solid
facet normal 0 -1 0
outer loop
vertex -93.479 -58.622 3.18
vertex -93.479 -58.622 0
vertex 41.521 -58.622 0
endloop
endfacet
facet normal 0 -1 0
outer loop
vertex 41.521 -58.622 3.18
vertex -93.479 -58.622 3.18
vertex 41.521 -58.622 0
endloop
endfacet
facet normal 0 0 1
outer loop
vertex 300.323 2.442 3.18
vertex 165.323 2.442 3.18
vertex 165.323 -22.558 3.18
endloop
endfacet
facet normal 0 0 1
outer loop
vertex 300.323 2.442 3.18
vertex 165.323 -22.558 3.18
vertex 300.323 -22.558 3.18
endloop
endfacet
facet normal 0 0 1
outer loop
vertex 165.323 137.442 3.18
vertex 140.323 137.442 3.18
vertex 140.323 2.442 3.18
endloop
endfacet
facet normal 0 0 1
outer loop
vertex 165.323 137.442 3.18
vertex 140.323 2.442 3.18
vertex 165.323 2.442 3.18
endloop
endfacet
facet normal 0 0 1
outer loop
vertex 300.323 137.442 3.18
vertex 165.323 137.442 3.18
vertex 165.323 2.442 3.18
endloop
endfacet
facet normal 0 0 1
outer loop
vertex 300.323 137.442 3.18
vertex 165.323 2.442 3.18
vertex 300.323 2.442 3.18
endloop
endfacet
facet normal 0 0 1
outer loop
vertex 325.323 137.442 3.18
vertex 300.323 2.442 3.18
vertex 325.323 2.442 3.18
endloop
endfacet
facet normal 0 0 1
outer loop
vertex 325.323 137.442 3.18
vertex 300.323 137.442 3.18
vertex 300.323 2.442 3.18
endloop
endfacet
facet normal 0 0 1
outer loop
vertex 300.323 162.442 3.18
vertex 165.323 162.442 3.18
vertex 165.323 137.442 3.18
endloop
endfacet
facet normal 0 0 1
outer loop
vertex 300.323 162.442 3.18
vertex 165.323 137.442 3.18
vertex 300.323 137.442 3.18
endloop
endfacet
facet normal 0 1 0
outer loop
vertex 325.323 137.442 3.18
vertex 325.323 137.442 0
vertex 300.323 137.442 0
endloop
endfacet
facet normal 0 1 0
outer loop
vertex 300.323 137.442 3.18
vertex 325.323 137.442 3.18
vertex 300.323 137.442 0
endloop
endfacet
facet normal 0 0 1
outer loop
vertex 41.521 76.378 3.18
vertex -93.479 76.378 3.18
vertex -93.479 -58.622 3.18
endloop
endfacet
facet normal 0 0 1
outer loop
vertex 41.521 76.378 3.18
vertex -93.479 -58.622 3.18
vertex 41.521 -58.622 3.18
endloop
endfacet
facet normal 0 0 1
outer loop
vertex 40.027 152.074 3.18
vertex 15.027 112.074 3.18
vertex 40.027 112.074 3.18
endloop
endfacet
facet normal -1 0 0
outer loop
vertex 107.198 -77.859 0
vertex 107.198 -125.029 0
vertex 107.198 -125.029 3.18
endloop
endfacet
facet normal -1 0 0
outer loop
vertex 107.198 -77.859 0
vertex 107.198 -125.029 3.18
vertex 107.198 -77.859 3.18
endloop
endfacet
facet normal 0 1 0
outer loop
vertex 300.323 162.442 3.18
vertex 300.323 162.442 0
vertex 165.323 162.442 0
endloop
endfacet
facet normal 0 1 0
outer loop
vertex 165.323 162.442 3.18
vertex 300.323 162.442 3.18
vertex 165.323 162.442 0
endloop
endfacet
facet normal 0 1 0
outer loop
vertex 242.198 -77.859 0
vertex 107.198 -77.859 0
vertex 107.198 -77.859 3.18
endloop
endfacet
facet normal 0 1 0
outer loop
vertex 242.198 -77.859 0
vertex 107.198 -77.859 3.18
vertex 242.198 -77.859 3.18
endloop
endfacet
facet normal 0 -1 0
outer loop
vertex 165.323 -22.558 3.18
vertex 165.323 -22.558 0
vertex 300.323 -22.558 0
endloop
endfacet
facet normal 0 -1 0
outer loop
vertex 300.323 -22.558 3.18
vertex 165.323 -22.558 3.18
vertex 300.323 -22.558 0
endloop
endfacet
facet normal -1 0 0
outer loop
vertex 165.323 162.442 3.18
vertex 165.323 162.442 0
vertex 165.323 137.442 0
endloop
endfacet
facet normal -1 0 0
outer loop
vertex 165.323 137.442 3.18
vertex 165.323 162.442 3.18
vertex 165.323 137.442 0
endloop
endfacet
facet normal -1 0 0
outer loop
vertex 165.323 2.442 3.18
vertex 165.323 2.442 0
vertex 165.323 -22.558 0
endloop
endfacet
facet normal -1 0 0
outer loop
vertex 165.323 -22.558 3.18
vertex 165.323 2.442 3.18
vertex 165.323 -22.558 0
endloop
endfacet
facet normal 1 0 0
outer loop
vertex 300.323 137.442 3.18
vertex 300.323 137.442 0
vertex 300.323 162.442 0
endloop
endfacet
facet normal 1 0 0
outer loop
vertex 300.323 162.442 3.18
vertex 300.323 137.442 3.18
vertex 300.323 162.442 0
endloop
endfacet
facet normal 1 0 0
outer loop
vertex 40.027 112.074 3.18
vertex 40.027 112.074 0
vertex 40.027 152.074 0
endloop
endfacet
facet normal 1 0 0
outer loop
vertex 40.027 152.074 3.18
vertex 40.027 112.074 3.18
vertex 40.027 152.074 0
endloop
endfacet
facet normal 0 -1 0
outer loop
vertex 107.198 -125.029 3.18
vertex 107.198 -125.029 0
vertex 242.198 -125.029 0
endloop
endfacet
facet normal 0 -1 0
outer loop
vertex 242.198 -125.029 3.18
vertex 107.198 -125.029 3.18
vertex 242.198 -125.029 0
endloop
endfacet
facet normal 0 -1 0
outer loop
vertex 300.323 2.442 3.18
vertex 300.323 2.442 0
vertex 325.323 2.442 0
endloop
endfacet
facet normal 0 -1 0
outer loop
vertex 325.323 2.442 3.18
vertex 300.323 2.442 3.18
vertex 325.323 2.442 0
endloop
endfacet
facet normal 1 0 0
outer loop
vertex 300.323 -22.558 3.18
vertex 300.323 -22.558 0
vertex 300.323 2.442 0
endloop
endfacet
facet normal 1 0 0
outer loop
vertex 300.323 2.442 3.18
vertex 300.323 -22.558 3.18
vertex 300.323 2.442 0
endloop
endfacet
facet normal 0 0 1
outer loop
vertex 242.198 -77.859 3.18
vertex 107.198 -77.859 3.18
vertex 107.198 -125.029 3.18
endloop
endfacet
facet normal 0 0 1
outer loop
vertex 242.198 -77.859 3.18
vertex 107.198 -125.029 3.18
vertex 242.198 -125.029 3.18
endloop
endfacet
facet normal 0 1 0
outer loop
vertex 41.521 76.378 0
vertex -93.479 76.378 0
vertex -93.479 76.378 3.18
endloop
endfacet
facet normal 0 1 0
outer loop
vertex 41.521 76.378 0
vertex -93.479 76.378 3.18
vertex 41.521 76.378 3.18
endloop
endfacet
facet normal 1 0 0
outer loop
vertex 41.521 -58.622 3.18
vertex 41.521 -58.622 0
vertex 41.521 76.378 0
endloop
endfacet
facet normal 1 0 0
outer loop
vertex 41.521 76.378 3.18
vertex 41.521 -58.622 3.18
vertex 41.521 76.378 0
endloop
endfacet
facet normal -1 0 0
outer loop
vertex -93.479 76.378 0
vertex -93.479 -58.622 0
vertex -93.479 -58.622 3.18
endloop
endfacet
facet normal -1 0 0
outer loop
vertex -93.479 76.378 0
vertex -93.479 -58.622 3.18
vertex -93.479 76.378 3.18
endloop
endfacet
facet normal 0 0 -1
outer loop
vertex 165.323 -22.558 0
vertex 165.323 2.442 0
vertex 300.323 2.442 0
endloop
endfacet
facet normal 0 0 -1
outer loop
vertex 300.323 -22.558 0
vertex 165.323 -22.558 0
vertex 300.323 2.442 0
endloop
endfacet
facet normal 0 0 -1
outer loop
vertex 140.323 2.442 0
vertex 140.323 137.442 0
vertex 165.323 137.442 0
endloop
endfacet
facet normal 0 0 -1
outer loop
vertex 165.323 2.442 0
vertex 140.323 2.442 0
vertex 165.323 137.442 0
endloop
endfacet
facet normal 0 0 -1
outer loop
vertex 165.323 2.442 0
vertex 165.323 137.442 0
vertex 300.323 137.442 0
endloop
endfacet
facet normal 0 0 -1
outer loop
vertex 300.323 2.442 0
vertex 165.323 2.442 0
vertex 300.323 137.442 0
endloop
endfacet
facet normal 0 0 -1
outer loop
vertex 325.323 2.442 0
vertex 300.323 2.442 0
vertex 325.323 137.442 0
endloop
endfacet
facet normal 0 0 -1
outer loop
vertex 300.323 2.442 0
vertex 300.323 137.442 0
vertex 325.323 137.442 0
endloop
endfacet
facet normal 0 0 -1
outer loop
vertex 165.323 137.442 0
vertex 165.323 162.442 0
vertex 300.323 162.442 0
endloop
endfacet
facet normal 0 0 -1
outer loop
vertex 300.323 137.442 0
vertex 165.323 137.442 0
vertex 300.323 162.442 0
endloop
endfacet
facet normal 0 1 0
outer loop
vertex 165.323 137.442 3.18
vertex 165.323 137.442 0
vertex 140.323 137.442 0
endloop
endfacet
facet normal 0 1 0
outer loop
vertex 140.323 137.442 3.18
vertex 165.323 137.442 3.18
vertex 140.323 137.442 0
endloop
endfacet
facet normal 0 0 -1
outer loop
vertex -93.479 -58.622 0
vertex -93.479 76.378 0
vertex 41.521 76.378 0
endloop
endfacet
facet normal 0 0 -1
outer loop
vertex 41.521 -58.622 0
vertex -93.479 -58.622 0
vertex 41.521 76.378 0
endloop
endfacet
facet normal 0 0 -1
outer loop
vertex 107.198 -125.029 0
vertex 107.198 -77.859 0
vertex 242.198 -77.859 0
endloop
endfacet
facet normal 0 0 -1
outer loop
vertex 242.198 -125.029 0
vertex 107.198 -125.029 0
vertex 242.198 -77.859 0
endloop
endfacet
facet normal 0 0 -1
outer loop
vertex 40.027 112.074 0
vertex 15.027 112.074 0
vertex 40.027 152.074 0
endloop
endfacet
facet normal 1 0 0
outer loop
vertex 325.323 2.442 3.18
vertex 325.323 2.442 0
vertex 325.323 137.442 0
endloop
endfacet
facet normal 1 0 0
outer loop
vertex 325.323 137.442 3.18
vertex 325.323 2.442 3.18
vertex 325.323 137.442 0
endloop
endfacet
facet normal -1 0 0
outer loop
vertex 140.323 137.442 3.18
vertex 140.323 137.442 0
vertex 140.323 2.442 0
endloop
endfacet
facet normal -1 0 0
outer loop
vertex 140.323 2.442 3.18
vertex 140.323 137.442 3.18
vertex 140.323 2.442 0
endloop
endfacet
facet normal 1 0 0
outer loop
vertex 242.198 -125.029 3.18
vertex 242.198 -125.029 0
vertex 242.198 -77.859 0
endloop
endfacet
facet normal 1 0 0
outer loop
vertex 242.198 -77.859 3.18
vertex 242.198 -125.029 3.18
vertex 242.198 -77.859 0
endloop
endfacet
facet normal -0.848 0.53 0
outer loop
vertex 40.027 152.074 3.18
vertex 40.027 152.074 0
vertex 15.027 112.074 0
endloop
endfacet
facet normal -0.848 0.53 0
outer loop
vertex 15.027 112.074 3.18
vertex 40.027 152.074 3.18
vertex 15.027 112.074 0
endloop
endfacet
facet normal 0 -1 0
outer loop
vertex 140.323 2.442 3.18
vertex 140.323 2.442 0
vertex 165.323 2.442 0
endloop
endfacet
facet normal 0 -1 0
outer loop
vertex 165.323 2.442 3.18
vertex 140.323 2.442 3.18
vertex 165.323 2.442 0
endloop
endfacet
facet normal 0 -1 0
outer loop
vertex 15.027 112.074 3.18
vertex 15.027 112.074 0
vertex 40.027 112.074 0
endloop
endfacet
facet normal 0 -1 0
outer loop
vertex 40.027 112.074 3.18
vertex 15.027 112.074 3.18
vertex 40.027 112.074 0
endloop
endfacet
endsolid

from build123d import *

# Parameters (mm, degrees)
F0_W     = 135
F0_H     = 135
F0_H_2   = 47.17
F1_DEPTH = 3.18


with BuildPart() as f1:
    # F0 (on Top) → F1 (new body)
    with BuildSketch(Plane.XY):
        with Locations((-25.979385, 8.878325)):
            Rectangle(F0_W, F0_H)
        Polygon((40.027325, 112.074353), (40.027325, 152.074353), (15.027325, 112.074353), align=None)
        with Locations((174.698469, -101.443551)):
            Rectangle(F0_W, F0_H_2)
        Polygon((232.822953, 69.941821), (232.822953, 162.441821), (165.322953, 162.441821), (165.322953, 137.441821), (140.322953, 137.441821), (140.322953, 69.941821), align=None)
        Polygon((232.822953, -22.558179), (232.822953, 69.941821), (140.322953, 69.941821), (140.322953, 2.441821), (165.322953, 2.441821), (165.322953, -22.558179), align=None)
        Polygon((325.322953, 2.441821), (325.322953, 69.941821), (232.822953, 69.941821), (232.822953, -22.558179), (300.322953, -22.558179), (300.322953, 2.441821), align=None)
        Polygon((300.322953, 137.441821), (300.322953, 162.441821), (232.822953, 162.441821), (232.822953, 69.941821), (325.322953, 69.941821), (325.322953, 137.441821), align=None)
    extrude(amount=F1_DEPTH)


solid = f1.part
